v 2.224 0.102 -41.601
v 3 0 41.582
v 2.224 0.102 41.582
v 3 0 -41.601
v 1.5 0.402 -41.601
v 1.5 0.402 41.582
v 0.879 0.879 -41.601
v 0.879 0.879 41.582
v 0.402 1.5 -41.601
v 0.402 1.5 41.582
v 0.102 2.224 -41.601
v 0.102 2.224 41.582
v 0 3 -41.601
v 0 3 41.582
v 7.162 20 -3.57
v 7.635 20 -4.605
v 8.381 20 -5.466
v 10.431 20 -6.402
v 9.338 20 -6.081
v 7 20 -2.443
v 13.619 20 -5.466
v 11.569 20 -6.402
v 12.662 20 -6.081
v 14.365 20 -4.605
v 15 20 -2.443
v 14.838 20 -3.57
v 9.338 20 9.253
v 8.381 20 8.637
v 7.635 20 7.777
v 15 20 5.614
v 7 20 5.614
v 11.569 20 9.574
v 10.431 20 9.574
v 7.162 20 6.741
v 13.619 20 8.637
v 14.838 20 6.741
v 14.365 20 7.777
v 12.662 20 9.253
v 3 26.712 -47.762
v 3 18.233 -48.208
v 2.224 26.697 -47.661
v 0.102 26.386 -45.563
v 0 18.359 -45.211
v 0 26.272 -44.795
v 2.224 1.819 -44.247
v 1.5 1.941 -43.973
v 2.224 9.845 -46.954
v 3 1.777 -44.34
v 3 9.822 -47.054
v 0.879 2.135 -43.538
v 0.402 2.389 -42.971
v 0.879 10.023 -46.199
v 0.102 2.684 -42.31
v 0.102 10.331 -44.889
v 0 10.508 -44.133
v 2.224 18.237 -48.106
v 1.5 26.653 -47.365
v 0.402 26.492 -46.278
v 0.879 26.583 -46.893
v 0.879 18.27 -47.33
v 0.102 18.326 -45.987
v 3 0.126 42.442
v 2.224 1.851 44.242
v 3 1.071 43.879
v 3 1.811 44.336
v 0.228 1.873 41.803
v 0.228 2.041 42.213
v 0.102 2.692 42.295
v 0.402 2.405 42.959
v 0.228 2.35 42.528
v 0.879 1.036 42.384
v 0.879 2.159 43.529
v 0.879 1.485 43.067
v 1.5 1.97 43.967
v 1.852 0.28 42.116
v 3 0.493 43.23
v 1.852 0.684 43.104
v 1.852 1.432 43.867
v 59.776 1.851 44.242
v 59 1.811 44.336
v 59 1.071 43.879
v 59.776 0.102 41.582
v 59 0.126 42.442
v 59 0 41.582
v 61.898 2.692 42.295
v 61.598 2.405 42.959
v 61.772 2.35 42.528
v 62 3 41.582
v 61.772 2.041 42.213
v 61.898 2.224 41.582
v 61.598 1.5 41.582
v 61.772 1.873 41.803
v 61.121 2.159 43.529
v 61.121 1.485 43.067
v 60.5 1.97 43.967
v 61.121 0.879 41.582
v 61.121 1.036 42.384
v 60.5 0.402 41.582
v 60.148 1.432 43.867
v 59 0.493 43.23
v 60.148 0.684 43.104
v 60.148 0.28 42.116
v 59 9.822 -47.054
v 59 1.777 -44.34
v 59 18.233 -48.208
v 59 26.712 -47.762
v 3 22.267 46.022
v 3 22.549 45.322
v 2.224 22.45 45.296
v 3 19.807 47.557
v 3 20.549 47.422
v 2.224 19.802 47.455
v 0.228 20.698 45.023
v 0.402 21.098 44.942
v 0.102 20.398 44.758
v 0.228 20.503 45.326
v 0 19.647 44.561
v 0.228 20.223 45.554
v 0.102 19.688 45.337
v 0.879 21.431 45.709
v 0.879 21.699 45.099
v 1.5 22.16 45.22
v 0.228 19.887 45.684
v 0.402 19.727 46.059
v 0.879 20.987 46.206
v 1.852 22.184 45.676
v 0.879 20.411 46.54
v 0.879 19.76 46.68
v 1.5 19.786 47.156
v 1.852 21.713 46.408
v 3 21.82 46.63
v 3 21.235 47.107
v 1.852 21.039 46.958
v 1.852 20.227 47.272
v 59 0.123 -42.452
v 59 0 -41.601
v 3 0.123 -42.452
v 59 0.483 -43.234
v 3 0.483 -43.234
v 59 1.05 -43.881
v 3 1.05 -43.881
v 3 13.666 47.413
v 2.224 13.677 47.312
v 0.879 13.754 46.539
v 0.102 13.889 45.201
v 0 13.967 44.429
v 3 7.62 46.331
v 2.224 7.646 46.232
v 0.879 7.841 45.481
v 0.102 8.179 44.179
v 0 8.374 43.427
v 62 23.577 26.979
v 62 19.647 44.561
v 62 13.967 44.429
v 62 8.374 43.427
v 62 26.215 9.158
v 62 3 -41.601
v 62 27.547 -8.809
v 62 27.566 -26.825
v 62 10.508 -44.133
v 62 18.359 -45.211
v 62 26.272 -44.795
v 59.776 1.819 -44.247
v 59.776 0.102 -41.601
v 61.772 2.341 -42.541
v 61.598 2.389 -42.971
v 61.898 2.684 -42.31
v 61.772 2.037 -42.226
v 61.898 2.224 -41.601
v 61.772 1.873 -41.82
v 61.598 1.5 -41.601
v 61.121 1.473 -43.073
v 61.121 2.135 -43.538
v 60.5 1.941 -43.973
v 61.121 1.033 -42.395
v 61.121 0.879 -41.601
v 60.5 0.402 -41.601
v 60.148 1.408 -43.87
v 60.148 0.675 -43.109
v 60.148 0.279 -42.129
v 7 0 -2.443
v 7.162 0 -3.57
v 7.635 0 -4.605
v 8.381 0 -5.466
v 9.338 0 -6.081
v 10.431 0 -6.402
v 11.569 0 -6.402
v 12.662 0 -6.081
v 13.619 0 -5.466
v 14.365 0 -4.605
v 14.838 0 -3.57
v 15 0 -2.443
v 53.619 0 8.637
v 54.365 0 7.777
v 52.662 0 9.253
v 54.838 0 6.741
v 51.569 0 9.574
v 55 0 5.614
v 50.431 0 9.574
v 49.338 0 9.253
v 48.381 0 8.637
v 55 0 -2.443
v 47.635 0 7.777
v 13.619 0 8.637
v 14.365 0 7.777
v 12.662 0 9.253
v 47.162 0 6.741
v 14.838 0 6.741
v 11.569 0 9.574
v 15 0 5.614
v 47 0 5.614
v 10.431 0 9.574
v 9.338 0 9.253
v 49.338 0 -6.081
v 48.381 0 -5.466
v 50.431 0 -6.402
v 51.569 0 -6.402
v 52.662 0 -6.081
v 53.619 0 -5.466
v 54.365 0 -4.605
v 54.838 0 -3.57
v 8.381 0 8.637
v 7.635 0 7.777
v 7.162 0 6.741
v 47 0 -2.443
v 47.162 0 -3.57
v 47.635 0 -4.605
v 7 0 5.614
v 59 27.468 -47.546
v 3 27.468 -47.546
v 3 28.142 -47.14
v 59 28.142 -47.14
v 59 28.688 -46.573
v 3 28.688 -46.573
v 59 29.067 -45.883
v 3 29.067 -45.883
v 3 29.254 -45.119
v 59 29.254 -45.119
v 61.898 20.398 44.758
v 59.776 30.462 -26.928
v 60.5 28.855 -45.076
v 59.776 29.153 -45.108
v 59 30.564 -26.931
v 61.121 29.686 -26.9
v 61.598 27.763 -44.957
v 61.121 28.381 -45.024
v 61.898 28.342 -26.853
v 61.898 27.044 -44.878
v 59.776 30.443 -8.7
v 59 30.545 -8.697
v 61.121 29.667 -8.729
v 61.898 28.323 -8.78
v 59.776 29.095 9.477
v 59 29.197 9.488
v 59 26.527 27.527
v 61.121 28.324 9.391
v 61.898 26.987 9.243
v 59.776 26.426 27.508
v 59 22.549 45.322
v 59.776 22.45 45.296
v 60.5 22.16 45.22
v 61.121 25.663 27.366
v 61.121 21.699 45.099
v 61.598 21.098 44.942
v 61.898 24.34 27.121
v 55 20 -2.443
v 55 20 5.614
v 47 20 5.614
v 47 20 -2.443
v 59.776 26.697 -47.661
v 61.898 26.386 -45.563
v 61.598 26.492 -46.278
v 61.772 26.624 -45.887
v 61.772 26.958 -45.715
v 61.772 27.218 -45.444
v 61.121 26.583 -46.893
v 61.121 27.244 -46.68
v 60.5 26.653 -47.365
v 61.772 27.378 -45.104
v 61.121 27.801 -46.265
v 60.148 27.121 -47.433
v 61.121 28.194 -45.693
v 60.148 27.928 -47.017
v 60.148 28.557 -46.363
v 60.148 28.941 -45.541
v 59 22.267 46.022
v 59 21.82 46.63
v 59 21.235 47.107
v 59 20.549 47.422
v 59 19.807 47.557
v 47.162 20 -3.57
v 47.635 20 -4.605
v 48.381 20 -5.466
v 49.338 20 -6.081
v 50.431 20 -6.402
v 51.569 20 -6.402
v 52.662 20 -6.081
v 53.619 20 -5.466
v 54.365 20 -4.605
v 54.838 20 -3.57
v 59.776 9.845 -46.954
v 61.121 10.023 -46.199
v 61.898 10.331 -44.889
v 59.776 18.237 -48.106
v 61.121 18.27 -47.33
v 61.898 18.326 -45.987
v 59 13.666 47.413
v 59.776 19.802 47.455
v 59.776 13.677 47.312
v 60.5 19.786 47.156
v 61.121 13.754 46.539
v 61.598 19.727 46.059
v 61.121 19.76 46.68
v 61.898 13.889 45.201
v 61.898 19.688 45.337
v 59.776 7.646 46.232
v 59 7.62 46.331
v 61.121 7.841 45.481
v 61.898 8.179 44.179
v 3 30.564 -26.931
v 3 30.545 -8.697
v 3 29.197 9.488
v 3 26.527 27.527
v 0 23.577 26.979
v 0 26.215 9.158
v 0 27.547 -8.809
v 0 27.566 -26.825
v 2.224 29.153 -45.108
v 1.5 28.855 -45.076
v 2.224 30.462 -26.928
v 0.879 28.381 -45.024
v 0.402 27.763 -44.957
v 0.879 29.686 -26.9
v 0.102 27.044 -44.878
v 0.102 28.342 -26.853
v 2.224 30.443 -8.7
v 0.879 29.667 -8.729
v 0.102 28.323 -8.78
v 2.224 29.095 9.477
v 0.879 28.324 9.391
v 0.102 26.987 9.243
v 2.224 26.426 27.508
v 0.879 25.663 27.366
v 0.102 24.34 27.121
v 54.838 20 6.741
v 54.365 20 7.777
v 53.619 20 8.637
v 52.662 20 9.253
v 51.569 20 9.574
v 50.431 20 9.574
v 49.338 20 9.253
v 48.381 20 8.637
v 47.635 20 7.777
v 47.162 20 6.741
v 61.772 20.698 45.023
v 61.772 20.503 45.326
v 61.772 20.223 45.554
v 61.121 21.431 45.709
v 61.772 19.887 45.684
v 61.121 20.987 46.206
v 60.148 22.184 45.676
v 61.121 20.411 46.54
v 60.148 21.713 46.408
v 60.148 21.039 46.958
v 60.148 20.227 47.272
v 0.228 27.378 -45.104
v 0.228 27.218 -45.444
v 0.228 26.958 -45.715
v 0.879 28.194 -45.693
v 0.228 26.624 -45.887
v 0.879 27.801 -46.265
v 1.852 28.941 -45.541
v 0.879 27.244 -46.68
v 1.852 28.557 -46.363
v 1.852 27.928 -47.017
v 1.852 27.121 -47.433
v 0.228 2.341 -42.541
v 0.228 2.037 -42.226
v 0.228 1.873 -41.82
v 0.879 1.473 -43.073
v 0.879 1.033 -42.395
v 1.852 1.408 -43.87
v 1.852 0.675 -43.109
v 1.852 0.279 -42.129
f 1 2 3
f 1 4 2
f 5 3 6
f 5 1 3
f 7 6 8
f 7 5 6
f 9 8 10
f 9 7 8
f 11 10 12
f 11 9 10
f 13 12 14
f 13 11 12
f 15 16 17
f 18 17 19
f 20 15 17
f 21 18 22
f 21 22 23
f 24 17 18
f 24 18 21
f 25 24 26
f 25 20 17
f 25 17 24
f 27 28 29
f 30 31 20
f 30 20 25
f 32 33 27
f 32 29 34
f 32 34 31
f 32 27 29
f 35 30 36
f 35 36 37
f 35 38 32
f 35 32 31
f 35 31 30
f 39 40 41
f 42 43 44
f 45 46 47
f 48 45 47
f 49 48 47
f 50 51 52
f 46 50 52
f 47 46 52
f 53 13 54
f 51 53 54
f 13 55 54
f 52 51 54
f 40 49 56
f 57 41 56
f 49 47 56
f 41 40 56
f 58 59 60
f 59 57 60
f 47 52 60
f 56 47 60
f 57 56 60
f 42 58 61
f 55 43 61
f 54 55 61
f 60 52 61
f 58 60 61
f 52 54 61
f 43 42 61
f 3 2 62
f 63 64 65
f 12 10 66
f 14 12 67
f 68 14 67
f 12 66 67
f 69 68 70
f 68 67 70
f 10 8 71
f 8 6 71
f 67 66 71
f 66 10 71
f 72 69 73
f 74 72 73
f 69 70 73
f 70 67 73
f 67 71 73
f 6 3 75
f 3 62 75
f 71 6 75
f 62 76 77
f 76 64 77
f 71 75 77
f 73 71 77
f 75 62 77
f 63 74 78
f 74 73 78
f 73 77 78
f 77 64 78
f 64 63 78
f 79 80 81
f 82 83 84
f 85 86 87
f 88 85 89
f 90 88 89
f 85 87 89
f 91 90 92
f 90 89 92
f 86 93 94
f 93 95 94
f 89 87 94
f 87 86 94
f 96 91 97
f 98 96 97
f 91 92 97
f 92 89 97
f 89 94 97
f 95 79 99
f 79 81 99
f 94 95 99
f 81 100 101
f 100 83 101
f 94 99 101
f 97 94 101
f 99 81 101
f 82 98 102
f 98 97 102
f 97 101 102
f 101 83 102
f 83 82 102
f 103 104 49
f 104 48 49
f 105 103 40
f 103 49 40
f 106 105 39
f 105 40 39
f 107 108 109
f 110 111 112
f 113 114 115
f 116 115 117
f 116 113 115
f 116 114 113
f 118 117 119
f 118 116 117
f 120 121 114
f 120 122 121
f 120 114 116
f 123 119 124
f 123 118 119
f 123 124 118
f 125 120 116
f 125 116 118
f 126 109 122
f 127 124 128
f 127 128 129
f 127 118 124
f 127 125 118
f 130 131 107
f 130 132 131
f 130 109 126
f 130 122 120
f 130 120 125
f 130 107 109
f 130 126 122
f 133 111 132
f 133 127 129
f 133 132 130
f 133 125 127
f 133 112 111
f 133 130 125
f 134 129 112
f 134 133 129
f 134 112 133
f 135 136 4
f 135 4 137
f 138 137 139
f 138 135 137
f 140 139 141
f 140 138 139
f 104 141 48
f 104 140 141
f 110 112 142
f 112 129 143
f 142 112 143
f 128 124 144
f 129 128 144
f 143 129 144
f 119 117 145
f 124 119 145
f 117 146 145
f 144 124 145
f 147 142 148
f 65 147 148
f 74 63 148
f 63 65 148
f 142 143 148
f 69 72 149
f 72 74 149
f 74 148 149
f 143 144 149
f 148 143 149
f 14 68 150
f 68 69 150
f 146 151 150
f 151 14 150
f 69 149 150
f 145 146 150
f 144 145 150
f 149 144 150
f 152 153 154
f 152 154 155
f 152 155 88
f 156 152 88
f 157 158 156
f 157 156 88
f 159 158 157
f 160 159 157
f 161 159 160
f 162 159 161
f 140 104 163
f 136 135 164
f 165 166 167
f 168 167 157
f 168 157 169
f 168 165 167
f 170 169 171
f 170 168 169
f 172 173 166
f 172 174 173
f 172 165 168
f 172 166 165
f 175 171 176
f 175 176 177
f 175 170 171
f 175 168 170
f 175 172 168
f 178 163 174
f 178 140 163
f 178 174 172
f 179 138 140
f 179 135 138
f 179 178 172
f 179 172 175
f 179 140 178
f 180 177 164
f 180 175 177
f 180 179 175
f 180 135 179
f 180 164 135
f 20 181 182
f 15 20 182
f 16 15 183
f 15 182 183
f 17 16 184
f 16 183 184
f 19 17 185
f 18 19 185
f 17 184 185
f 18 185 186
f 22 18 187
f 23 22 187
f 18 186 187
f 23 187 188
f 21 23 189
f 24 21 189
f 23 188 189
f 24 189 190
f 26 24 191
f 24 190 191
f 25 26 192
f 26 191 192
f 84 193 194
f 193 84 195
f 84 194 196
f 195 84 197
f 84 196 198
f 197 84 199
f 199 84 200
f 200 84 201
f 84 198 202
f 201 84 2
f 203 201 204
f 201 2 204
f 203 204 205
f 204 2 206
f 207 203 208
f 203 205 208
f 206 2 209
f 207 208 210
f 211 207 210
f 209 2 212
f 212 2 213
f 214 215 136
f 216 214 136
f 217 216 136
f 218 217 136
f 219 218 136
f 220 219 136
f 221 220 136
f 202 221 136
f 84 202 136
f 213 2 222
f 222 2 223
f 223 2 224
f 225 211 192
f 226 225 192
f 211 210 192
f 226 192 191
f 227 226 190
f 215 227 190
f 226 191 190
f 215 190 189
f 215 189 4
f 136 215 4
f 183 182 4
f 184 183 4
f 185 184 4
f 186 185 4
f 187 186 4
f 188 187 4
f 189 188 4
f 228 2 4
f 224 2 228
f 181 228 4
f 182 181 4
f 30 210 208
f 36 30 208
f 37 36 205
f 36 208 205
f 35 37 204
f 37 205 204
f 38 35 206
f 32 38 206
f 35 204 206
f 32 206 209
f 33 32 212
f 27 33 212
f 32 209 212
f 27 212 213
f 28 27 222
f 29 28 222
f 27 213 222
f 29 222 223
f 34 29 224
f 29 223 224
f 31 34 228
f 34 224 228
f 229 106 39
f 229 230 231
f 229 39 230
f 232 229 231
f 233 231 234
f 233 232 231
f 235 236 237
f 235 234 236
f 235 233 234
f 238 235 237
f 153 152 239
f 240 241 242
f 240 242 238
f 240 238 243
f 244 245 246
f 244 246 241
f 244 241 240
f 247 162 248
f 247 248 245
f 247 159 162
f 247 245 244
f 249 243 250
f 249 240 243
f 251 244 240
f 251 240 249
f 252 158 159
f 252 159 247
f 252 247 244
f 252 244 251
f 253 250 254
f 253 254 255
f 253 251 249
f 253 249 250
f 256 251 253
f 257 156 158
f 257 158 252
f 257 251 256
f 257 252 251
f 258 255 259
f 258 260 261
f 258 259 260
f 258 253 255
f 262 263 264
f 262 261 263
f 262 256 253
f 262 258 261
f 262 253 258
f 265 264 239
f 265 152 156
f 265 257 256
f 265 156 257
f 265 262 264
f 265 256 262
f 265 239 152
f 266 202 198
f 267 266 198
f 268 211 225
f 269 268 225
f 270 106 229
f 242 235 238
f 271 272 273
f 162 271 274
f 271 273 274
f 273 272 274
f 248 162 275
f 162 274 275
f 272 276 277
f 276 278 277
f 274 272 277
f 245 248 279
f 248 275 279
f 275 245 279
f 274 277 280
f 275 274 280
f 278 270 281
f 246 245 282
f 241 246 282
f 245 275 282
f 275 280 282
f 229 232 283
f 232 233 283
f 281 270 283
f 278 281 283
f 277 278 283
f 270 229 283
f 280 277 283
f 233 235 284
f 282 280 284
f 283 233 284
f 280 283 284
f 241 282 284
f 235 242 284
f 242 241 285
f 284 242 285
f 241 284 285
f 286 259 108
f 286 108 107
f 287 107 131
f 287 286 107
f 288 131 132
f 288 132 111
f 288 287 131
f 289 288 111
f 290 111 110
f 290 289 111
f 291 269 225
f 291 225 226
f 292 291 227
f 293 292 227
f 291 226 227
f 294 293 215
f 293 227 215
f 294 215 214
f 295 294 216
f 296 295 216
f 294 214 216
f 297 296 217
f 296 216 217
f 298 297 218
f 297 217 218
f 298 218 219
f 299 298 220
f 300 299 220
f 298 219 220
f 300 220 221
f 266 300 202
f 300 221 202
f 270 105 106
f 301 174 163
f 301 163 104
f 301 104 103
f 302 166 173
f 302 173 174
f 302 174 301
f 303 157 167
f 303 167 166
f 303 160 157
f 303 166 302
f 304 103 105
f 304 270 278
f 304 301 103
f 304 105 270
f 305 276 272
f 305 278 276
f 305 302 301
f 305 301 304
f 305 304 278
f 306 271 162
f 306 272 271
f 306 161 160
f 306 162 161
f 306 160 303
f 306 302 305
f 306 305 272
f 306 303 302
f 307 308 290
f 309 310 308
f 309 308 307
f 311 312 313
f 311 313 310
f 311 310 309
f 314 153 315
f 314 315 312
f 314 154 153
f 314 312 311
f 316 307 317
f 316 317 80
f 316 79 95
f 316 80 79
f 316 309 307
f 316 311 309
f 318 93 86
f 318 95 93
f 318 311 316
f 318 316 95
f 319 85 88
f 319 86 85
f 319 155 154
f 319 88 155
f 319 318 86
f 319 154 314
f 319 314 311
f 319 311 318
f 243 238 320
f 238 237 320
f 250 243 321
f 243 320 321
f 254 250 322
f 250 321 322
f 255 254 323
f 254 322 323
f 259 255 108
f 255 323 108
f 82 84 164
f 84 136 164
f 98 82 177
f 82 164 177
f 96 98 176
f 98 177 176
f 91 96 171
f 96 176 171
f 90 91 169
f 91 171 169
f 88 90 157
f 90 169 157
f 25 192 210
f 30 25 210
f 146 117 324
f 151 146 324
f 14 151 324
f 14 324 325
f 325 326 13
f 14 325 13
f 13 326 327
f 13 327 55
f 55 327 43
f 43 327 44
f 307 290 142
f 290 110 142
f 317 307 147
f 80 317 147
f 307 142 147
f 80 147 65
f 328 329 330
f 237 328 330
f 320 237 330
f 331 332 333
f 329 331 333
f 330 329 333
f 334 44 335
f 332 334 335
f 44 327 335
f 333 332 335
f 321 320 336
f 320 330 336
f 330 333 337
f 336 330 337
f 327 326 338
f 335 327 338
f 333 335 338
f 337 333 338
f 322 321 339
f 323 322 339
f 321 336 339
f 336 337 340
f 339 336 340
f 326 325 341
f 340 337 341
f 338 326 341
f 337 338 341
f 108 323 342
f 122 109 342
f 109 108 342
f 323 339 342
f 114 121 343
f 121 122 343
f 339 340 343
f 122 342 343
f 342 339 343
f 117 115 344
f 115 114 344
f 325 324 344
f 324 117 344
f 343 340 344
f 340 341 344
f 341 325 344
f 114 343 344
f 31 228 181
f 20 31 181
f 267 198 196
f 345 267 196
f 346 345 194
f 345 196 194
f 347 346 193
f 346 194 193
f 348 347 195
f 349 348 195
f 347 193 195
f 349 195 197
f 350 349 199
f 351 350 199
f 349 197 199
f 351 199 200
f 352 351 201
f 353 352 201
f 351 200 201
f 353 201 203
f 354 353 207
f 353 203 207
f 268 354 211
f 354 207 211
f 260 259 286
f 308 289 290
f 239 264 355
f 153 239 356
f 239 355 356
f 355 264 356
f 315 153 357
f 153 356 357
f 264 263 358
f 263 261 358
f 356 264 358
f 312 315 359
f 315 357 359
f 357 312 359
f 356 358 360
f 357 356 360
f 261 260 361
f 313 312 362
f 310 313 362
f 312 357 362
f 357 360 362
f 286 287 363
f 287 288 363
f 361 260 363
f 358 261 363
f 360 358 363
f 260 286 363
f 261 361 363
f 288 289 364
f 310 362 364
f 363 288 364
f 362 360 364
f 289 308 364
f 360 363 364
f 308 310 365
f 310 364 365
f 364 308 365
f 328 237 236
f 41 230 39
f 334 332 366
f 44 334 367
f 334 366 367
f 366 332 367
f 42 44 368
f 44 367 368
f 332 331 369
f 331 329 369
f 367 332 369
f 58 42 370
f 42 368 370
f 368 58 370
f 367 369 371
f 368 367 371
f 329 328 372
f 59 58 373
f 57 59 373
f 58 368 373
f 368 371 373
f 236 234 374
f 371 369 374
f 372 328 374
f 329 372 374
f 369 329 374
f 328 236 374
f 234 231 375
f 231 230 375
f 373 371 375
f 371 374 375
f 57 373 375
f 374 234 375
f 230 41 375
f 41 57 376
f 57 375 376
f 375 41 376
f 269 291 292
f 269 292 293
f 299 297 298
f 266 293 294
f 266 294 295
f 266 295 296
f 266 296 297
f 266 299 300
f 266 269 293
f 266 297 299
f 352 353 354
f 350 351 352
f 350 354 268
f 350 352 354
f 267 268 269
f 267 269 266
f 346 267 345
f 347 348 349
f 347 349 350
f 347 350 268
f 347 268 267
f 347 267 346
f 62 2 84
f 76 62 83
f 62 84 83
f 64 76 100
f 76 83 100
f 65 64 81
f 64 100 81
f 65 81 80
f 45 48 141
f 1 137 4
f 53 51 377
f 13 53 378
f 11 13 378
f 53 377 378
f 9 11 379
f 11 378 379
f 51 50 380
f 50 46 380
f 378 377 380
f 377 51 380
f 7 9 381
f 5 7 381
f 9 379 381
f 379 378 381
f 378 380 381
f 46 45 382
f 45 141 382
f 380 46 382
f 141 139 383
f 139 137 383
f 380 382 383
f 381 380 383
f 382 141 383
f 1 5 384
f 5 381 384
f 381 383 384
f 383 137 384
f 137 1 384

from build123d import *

# Parameters (mm, degrees)
BOSS_EXTRUDE1_DEPTH = 62
FILLET1_R           = 3
SKETCH2_R           = 4
CUT_EXTRUDE1_DEPTH  = 20


with BuildPart() as part:
    # Sketch1 → Boss-Extrude1 (new body)
    with BuildSketch(Plane(origin=(0, 0, 0), x_dir=(0, 0, -1), z_dir=(1, 0, 0))):
        with BuildLine():
            Line((-43.5, 0), (43.5, 0))
            ThreePointArc((43.5, 0), (47.853804482, 14.177339776), (47.362560683, 29))
            ThreePointArc((47.362560683, 29), (-0.343872677, 30.041597997), (-47.379193576, 22))
            ThreePointArc((-47.379193576, 22), (-47.006596643, 10.723695647), (-43.5, 0))
        make_face()
    extrude(amount=BOSS_EXTRUDE1_DEPTH)

    # Fillet1
    fillet1_edges = [part.edges().sort_by_distance(p)[0] for p in [
        (62, 14.177339776, -47.853804482),
        (62, 30.041597997, 0.343872677),
        (62, 10.723695647, 47.006596643),
        (0, 30.041597997, 0.343872677),
        (0, 14.177339776, -47.853804482),
        (0, 0, 0),
        (0, 10.723695647, 47.006596643),
        (62, 0, 0),
        (31, 22, 47.379193576),
        (31, 29, -47.362560683),
        (31, 0, -43.5),
        (31, 0, 43.5),
    ]]
    fillet(fillet1_edges, radius=FILLET1_R)

    # Sketch2 → Cut-Extrude1 (cut)
    with BuildSketch(Plane.XZ):
        with Locations((11, 5.614286523)):
            Circle(SKETCH2_R)
        with BuildLine():
            ThreePointArc((15, 5.614286523), (11, 1.614286523), (7, 5.614286523))
            Line((7, 5.614286523), (7, -2.442860068))
            ThreePointArc((7, -2.442860068), (11, 1.557139932), (15, -2.442860068))
            Line((15, -2.442860068), (15, 5.614286523))
        make_face()
        with BuildLine():
            ThreePointArc((15, -2.442860068), (11, 1.557139932), (7, -2.442860068))
            Line((7, -2.442860068), (15, -2.442860068))
        make_face()
        with BuildLine():
            Line((15, -2.442860068), (7, -2.442860068))
            ThreePointArc((7, -2.442860068), (11, -6.442860068), (15, -2.442860068))
        make_face()
        with Locations((51, -2.442860068)):
            Circle(SKETCH2_R)
        with BuildLine():
            Line((47, 5.614286523), (47, -2.442860068))
            ThreePointArc((47, -2.442860068), (51, 1.557139932), (55, -2.442860068))
            Line((55, -2.442860068), (55, 5.614286523))
            ThreePointArc((55, 5.614286523), (51, 1.614286523), (47, 5.614286523))
        make_face()
        with Locations((51, 5.614286523)):
            Circle(SKETCH2_R)
    extrude(amount=-CUT_EXTRUDE1_DEPTH, mode=Mode.SUBTRACT)


solid = part.part
